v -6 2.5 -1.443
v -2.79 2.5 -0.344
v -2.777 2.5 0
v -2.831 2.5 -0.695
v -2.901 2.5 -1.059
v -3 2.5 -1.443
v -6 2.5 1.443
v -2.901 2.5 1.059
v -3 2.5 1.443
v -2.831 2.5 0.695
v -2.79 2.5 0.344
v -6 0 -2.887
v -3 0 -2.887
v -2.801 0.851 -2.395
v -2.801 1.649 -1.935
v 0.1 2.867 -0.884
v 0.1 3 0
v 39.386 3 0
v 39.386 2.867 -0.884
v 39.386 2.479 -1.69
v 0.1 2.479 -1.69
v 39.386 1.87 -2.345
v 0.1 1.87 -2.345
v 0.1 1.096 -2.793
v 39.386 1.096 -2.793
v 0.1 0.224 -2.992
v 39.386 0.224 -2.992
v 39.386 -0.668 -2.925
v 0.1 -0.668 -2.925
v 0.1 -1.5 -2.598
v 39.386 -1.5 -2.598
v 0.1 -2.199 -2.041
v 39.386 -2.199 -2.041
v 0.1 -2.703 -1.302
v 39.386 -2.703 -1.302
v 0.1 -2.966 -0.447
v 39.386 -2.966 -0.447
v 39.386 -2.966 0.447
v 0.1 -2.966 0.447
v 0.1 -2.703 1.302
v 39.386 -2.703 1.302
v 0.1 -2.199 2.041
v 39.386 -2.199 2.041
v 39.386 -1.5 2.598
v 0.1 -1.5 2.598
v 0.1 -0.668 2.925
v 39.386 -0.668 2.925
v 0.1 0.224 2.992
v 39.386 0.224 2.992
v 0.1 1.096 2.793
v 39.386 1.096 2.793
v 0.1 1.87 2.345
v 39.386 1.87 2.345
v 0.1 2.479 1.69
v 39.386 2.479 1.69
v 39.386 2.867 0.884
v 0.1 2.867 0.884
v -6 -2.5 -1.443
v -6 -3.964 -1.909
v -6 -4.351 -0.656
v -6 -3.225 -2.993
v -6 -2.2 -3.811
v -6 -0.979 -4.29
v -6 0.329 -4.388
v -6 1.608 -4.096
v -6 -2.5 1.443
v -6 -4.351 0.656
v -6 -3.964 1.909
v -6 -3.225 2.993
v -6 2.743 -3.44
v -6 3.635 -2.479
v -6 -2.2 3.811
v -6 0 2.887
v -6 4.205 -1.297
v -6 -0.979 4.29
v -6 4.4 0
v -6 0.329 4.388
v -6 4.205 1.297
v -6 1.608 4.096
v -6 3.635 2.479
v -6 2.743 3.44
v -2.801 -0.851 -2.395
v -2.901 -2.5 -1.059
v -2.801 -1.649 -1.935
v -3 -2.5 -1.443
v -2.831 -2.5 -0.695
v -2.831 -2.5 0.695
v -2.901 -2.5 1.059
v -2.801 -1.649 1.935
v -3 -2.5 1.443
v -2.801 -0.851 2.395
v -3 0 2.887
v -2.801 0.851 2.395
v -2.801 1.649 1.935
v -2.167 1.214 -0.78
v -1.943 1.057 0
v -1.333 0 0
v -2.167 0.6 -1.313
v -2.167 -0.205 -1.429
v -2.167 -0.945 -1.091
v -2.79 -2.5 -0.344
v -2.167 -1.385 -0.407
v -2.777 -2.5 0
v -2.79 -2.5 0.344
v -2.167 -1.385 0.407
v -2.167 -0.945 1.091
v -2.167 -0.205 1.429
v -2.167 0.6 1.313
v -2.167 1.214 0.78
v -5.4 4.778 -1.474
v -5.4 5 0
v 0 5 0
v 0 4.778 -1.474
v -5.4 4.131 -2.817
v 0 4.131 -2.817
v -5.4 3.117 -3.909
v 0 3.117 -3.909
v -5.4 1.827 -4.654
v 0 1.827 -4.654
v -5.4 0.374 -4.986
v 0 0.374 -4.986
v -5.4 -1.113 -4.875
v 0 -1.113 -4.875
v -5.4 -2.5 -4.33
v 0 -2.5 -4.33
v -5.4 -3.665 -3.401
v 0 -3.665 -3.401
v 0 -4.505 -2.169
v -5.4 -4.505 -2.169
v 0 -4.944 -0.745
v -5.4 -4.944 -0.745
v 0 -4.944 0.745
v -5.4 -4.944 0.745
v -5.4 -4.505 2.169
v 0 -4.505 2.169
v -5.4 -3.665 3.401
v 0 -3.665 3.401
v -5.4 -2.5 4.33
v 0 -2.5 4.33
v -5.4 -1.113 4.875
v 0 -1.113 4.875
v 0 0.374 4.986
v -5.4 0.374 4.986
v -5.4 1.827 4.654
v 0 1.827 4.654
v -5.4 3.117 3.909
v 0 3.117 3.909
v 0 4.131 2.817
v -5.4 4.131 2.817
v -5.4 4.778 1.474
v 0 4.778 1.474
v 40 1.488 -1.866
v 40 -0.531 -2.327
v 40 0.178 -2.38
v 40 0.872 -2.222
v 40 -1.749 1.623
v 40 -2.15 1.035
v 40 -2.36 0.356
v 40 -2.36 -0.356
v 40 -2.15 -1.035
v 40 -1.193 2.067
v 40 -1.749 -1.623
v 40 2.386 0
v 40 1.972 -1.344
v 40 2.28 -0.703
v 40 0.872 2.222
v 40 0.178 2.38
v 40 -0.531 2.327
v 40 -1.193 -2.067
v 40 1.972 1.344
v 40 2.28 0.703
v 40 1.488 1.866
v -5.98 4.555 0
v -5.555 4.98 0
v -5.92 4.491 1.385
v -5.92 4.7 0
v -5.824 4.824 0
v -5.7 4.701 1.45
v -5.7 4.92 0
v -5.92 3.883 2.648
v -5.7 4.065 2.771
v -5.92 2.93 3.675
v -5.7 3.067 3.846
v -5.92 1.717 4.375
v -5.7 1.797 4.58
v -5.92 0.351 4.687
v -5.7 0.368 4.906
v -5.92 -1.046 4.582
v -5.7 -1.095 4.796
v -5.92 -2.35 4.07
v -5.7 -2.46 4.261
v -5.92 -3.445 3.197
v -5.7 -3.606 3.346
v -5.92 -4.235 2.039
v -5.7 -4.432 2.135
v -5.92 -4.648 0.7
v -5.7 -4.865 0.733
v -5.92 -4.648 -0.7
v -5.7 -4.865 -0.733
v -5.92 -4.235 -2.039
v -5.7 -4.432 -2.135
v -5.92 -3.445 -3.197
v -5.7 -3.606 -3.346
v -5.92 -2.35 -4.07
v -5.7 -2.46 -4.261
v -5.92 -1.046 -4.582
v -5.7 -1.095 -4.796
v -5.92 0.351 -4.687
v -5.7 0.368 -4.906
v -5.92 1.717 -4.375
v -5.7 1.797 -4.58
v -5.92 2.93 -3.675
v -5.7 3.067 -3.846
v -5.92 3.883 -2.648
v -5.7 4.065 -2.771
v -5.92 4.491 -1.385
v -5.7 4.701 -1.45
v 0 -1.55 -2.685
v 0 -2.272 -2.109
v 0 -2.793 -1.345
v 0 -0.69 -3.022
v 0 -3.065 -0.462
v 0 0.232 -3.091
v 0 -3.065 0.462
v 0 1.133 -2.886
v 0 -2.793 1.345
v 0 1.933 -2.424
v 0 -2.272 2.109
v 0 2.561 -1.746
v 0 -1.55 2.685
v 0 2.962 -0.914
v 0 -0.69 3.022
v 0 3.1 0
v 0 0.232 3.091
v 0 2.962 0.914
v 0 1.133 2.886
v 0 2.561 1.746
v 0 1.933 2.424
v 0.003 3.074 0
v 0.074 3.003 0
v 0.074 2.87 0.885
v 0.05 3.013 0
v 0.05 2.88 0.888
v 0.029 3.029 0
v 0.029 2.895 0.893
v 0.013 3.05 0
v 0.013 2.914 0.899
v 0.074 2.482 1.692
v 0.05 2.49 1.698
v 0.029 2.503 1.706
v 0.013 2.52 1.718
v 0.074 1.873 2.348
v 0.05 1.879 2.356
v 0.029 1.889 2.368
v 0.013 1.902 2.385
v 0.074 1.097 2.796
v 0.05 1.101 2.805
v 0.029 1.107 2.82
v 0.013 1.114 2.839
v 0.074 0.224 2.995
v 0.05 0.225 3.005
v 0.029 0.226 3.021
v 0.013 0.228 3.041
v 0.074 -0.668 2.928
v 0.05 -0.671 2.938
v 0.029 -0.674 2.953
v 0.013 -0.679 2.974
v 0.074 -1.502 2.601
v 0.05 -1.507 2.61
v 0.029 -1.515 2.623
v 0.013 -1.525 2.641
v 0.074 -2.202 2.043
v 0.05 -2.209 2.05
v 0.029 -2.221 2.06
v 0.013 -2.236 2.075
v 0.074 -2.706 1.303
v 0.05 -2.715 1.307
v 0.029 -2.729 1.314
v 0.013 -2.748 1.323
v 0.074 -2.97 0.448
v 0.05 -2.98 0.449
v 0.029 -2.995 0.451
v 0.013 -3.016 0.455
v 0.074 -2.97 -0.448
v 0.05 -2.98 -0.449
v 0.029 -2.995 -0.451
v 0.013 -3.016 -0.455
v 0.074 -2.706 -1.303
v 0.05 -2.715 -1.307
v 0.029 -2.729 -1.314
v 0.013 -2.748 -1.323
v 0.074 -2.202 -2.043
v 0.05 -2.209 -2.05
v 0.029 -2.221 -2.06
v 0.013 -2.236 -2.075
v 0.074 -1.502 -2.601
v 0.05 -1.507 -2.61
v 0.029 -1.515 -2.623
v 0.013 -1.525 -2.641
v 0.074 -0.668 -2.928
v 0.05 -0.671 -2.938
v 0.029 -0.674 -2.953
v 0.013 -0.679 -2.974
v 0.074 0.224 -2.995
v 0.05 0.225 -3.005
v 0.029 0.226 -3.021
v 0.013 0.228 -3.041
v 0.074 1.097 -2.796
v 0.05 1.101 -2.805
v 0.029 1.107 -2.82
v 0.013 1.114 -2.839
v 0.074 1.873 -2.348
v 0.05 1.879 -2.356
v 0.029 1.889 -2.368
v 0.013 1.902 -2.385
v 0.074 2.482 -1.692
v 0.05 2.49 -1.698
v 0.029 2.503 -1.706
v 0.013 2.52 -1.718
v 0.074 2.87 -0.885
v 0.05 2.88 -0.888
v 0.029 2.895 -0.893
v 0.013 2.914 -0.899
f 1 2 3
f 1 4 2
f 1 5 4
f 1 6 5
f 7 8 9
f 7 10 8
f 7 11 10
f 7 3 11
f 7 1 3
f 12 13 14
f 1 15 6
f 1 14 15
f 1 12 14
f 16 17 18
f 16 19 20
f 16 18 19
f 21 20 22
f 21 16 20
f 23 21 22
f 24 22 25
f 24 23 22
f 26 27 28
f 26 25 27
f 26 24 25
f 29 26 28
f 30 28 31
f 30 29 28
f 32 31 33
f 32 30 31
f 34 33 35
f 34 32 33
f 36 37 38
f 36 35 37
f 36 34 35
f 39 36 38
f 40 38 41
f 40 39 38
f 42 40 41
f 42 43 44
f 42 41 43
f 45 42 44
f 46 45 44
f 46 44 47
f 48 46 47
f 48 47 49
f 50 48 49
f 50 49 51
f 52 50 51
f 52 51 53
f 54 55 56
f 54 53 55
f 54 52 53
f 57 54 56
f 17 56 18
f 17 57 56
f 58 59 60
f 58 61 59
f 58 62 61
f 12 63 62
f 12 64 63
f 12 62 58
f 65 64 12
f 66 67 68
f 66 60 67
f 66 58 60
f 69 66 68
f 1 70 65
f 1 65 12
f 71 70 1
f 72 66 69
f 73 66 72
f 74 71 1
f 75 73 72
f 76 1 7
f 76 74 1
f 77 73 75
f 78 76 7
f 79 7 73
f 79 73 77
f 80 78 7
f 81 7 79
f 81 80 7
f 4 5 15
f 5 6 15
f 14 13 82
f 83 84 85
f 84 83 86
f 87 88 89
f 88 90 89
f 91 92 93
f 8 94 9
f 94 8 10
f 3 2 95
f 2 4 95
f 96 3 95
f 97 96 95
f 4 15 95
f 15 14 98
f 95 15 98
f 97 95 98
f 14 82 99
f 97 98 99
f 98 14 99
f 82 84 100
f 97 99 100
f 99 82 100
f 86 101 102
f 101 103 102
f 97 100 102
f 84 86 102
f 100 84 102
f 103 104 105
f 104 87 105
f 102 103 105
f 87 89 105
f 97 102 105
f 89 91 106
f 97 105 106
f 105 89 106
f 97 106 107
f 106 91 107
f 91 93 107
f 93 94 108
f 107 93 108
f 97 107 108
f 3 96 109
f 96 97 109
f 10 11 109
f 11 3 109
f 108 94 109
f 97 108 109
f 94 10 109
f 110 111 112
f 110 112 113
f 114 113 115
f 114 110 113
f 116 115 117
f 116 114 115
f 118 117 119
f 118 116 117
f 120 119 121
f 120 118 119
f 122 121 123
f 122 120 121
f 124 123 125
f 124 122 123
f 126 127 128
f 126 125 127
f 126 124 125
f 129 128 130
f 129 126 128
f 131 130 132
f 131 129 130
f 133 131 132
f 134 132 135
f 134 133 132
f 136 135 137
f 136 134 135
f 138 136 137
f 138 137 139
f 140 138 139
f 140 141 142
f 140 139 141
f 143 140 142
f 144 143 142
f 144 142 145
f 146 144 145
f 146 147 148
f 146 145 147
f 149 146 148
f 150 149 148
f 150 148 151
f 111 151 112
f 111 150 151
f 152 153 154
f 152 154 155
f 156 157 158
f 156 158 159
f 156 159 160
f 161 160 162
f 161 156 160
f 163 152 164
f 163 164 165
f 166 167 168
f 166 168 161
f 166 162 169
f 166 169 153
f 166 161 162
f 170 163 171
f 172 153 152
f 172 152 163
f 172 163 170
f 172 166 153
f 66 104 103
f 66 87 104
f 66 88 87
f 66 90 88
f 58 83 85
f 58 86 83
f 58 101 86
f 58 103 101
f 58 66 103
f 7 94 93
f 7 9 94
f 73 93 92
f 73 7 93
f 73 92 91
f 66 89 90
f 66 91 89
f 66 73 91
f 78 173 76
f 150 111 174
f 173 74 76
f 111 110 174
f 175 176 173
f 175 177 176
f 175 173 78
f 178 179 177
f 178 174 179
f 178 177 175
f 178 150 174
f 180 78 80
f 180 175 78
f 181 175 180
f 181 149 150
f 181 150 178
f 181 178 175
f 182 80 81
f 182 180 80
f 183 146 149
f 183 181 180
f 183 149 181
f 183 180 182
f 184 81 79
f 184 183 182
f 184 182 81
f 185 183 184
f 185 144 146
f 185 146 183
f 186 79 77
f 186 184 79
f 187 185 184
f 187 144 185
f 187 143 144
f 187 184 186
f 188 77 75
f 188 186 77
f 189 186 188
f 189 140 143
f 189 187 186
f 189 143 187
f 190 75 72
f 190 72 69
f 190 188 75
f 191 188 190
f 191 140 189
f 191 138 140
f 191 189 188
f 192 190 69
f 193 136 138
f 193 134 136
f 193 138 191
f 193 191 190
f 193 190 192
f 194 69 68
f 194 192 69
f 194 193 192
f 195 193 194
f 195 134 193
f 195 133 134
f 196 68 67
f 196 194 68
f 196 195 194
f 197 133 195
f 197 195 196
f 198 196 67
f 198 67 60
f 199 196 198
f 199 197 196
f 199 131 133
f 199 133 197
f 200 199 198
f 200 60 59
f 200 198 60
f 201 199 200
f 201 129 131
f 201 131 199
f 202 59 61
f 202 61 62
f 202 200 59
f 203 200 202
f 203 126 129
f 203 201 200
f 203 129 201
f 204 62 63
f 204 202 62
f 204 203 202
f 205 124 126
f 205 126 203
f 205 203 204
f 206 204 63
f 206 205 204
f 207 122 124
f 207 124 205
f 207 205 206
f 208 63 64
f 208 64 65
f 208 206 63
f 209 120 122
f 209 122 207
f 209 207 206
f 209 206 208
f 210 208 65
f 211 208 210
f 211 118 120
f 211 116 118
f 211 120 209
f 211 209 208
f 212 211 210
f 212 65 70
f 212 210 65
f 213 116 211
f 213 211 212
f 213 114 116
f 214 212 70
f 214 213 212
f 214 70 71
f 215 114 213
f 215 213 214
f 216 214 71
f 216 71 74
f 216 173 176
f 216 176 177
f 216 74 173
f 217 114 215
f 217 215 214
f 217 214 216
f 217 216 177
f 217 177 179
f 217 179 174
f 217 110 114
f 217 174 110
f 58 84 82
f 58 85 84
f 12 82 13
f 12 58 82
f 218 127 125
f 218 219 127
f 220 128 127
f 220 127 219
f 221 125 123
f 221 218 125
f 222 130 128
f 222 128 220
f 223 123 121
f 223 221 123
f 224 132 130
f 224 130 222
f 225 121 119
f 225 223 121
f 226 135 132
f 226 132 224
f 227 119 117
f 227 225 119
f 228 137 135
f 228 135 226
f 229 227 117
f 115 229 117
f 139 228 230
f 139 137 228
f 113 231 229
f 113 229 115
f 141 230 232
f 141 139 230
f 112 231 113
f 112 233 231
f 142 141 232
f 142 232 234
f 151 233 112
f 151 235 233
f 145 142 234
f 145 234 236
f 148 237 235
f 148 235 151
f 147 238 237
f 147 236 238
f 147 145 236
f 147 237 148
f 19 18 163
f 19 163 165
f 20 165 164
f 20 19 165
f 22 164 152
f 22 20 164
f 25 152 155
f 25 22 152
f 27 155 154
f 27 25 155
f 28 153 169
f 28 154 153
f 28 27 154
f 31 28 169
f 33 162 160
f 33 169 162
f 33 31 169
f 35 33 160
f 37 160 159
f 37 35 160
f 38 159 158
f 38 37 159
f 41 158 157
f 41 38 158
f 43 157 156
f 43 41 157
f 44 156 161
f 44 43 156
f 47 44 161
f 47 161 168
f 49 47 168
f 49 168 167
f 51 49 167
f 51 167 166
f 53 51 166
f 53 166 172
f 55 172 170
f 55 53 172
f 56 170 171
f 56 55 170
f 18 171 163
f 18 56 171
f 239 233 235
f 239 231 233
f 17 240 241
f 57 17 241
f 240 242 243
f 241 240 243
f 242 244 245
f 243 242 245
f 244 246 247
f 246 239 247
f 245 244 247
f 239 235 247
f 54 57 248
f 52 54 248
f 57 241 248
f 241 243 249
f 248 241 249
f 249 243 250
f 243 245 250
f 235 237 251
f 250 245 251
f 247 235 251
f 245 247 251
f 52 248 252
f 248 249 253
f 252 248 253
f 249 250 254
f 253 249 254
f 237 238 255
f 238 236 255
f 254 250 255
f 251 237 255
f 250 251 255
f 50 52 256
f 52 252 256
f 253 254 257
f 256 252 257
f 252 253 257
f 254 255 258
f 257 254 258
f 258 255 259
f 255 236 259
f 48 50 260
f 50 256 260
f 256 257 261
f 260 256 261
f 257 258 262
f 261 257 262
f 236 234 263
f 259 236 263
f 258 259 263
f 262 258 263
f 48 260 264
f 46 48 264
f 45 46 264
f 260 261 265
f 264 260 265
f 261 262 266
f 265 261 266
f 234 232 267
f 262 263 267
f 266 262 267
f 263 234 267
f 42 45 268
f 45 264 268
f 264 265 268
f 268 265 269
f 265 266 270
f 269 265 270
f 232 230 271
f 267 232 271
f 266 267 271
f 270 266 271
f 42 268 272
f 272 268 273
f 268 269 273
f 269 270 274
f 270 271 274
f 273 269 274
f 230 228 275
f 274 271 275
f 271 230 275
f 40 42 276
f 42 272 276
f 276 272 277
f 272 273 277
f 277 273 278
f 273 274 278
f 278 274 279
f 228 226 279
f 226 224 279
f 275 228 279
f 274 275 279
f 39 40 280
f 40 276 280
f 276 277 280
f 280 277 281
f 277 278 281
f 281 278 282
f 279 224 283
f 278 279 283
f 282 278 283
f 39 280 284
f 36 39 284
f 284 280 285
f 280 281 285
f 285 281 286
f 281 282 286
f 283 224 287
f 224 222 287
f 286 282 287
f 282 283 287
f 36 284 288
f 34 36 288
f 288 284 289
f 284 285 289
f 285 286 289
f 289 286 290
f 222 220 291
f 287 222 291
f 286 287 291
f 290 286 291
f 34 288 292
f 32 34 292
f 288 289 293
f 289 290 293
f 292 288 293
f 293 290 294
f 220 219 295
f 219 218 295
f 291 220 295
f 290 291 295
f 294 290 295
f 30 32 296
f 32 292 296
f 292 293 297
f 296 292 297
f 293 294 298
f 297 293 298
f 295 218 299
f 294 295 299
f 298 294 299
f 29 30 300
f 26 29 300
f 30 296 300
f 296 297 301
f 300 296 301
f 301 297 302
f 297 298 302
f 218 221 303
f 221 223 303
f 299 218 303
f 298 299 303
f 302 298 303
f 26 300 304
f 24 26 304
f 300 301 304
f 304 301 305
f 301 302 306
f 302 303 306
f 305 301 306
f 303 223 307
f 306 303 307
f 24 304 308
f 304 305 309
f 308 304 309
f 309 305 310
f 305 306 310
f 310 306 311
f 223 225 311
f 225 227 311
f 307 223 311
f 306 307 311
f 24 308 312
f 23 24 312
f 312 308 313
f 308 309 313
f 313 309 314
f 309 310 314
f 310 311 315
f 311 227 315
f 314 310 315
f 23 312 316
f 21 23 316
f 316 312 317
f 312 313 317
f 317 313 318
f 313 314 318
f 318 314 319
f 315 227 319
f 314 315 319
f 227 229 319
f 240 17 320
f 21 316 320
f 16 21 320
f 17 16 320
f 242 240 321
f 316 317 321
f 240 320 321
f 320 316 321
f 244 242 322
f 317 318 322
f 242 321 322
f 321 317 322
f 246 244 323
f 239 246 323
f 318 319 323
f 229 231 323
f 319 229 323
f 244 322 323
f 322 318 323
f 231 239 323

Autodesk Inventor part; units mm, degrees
ref_plane "YZ Plane" through (0, 0, 0) normal (1, 0, 0) x (0, 1, 0)
ref_plane "XZ Plane" through (0, 0, 0) normal (0, 1, 0) x (-1, 0, 0)
sketch "Sketch1" plane through (0, 0, 0) normal (0, 0, 1) x (1, 0, 0)
  line L0 (-1.3333, 0) -> (40, 0)
  line L1 (40, 0) -> (40, 3)
  line L2 (40, 3) -> (22, 3)
  line L3 (22, 3) -> (21.3865, 3)
  line L4 (21.3865, 3) -> (0, 3)
  line L5 (0, 3) -> (0, 5)
  line L6 (0, 5) -> (-6, 5)
  line L7 (-6, 5) -> (-6, 2.8868)
  line L8 (-6, 2.8868) -> (-3, 2.8868)
  line L9 (-3, 2.8868) -> (-1.3333, 0)
  line L10 (-15.2, 0) -> (49.2, 0) projected
  line L11 (0, -1) -> (0, 6) projected
  line L12 (22, 3) -> (0, 3) construction
  dimension "d1" = 18
  dimension "d2" = 0.6136
  dimension "d3" = 6
  dimension "d4" = 3
  dimension "d5" = 60
  dimension "d6" = 6
  dimension "d7" = 6
  dimension "d8" = 5.7735
  dimension "d9" = 10
  dimension "d26" = 40
revolve "Body" add sketch "Sketch1" angle 360 about axis through (-1.3333, 0, 0) along (1, 0, 0)
sketch "Sketch2" plane through (-6, 0, 0) normal (-1, 0, 0) x (0, 0, 1)
  circle A0 centre (0, 0) radius 2.8868 projected
  line L0 (0, -7) -> (0, 7) projected
  line L1 (-7, 0) -> (7, 0) projected
  line L2 (2.8868, 0) -> (1.4434, -2.5)
  line L3 (1.4434, -2.5) -> (-1.4434, -2.5)
  line L4 (-1.4434, -2.5) -> (-2.8868, 0)
  line L5 (-2.8868, 0) -> (-1.4434, 2.5)
  line L6 (-1.4434, 2.5) -> (1.4434, 2.5)
  line L7 (1.4434, 2.5) -> (2.8868, 0)
extrude "Slot" add sketch "Sketch2" against normal up to next contours L7 A0 | A0 L2 | L6 L0 A0 | A0 L0 L3 | L0 L6 A0 | A0 L3 L0 | L4 A0 | A0 L5
fillet "Fillet1" radius 0.6 1 edges at (-6, -5, 0)
thread "Thread" size "M6x1" class "6g" standard "ISO Metric profile" length 18
chamfer "Chamfer1" distance 0.6135 distance2 0.6135 1 edges at (40, -3, 0) measured on face at (40, -0.7485, 0.6631)
ref_plane "Work Plane1" through (29, 0, 0) normal (0, -1, 0) x (1, 0, 0)
fillet "Fillet2" radius 0.1 1 edges at (0, -3, 0)
equation "\"d1\" = GEL"
equation "\"d3\" = KOH"
equation "\"d4\" = INTI"
equation "\"d6\" = GD"
equation "\"d7\" = BDM"
equation "\"d8\" = 1.1547 * SW"
equation "\"d9\" = KOD"
equation "\"d26\" = NLG"
equation "\"d30\" = R"
equation "\"d17\" = RR"
equation "\"d13\" = GEL"
equation "\"d15\" = -0.5 * SPD + 0.5 * GD"
equation "\"d16\" = GUL"
equation "\"GD\" = NND"
equation "\"NLG\" = 40"
equation "\"GEL\" = 18"
equation "\"KOD\" = 10"
equation "\"KOH\" = NND"
equation "\"INTI\" = 3"
equation "\"GAL\" = 0.61345 * PTC"
equation "\"GUL\" = 0.61345 * PTC"
equation "\"BDM\" = NND"
equation "\"SW\" = 5"
equation "\"RR\" = 0.1 * NND"
equation "\"SPD\" = NND - 1.2269 * PTC"
equation "\"R\" = 0.1"
equation "\"PHH\" = 0.2"
equation "\"GD1\" = THREADDIA - 1.2269 * PTC"
equation "\"THREADDIA\" = 6"
equation "\"FAWI\" = 45deg"
equation "\"PTC\" = 1"
equation "\"KOH1\" = 5.4"
equation "\"NND\" = 6"
equation "\"TOA\" = 30deg"
equation "\"E0\" = 1.155 * SW"
properties part number "AS 1420 - 1973 - M6 x 40" material "Steel, Mild"
